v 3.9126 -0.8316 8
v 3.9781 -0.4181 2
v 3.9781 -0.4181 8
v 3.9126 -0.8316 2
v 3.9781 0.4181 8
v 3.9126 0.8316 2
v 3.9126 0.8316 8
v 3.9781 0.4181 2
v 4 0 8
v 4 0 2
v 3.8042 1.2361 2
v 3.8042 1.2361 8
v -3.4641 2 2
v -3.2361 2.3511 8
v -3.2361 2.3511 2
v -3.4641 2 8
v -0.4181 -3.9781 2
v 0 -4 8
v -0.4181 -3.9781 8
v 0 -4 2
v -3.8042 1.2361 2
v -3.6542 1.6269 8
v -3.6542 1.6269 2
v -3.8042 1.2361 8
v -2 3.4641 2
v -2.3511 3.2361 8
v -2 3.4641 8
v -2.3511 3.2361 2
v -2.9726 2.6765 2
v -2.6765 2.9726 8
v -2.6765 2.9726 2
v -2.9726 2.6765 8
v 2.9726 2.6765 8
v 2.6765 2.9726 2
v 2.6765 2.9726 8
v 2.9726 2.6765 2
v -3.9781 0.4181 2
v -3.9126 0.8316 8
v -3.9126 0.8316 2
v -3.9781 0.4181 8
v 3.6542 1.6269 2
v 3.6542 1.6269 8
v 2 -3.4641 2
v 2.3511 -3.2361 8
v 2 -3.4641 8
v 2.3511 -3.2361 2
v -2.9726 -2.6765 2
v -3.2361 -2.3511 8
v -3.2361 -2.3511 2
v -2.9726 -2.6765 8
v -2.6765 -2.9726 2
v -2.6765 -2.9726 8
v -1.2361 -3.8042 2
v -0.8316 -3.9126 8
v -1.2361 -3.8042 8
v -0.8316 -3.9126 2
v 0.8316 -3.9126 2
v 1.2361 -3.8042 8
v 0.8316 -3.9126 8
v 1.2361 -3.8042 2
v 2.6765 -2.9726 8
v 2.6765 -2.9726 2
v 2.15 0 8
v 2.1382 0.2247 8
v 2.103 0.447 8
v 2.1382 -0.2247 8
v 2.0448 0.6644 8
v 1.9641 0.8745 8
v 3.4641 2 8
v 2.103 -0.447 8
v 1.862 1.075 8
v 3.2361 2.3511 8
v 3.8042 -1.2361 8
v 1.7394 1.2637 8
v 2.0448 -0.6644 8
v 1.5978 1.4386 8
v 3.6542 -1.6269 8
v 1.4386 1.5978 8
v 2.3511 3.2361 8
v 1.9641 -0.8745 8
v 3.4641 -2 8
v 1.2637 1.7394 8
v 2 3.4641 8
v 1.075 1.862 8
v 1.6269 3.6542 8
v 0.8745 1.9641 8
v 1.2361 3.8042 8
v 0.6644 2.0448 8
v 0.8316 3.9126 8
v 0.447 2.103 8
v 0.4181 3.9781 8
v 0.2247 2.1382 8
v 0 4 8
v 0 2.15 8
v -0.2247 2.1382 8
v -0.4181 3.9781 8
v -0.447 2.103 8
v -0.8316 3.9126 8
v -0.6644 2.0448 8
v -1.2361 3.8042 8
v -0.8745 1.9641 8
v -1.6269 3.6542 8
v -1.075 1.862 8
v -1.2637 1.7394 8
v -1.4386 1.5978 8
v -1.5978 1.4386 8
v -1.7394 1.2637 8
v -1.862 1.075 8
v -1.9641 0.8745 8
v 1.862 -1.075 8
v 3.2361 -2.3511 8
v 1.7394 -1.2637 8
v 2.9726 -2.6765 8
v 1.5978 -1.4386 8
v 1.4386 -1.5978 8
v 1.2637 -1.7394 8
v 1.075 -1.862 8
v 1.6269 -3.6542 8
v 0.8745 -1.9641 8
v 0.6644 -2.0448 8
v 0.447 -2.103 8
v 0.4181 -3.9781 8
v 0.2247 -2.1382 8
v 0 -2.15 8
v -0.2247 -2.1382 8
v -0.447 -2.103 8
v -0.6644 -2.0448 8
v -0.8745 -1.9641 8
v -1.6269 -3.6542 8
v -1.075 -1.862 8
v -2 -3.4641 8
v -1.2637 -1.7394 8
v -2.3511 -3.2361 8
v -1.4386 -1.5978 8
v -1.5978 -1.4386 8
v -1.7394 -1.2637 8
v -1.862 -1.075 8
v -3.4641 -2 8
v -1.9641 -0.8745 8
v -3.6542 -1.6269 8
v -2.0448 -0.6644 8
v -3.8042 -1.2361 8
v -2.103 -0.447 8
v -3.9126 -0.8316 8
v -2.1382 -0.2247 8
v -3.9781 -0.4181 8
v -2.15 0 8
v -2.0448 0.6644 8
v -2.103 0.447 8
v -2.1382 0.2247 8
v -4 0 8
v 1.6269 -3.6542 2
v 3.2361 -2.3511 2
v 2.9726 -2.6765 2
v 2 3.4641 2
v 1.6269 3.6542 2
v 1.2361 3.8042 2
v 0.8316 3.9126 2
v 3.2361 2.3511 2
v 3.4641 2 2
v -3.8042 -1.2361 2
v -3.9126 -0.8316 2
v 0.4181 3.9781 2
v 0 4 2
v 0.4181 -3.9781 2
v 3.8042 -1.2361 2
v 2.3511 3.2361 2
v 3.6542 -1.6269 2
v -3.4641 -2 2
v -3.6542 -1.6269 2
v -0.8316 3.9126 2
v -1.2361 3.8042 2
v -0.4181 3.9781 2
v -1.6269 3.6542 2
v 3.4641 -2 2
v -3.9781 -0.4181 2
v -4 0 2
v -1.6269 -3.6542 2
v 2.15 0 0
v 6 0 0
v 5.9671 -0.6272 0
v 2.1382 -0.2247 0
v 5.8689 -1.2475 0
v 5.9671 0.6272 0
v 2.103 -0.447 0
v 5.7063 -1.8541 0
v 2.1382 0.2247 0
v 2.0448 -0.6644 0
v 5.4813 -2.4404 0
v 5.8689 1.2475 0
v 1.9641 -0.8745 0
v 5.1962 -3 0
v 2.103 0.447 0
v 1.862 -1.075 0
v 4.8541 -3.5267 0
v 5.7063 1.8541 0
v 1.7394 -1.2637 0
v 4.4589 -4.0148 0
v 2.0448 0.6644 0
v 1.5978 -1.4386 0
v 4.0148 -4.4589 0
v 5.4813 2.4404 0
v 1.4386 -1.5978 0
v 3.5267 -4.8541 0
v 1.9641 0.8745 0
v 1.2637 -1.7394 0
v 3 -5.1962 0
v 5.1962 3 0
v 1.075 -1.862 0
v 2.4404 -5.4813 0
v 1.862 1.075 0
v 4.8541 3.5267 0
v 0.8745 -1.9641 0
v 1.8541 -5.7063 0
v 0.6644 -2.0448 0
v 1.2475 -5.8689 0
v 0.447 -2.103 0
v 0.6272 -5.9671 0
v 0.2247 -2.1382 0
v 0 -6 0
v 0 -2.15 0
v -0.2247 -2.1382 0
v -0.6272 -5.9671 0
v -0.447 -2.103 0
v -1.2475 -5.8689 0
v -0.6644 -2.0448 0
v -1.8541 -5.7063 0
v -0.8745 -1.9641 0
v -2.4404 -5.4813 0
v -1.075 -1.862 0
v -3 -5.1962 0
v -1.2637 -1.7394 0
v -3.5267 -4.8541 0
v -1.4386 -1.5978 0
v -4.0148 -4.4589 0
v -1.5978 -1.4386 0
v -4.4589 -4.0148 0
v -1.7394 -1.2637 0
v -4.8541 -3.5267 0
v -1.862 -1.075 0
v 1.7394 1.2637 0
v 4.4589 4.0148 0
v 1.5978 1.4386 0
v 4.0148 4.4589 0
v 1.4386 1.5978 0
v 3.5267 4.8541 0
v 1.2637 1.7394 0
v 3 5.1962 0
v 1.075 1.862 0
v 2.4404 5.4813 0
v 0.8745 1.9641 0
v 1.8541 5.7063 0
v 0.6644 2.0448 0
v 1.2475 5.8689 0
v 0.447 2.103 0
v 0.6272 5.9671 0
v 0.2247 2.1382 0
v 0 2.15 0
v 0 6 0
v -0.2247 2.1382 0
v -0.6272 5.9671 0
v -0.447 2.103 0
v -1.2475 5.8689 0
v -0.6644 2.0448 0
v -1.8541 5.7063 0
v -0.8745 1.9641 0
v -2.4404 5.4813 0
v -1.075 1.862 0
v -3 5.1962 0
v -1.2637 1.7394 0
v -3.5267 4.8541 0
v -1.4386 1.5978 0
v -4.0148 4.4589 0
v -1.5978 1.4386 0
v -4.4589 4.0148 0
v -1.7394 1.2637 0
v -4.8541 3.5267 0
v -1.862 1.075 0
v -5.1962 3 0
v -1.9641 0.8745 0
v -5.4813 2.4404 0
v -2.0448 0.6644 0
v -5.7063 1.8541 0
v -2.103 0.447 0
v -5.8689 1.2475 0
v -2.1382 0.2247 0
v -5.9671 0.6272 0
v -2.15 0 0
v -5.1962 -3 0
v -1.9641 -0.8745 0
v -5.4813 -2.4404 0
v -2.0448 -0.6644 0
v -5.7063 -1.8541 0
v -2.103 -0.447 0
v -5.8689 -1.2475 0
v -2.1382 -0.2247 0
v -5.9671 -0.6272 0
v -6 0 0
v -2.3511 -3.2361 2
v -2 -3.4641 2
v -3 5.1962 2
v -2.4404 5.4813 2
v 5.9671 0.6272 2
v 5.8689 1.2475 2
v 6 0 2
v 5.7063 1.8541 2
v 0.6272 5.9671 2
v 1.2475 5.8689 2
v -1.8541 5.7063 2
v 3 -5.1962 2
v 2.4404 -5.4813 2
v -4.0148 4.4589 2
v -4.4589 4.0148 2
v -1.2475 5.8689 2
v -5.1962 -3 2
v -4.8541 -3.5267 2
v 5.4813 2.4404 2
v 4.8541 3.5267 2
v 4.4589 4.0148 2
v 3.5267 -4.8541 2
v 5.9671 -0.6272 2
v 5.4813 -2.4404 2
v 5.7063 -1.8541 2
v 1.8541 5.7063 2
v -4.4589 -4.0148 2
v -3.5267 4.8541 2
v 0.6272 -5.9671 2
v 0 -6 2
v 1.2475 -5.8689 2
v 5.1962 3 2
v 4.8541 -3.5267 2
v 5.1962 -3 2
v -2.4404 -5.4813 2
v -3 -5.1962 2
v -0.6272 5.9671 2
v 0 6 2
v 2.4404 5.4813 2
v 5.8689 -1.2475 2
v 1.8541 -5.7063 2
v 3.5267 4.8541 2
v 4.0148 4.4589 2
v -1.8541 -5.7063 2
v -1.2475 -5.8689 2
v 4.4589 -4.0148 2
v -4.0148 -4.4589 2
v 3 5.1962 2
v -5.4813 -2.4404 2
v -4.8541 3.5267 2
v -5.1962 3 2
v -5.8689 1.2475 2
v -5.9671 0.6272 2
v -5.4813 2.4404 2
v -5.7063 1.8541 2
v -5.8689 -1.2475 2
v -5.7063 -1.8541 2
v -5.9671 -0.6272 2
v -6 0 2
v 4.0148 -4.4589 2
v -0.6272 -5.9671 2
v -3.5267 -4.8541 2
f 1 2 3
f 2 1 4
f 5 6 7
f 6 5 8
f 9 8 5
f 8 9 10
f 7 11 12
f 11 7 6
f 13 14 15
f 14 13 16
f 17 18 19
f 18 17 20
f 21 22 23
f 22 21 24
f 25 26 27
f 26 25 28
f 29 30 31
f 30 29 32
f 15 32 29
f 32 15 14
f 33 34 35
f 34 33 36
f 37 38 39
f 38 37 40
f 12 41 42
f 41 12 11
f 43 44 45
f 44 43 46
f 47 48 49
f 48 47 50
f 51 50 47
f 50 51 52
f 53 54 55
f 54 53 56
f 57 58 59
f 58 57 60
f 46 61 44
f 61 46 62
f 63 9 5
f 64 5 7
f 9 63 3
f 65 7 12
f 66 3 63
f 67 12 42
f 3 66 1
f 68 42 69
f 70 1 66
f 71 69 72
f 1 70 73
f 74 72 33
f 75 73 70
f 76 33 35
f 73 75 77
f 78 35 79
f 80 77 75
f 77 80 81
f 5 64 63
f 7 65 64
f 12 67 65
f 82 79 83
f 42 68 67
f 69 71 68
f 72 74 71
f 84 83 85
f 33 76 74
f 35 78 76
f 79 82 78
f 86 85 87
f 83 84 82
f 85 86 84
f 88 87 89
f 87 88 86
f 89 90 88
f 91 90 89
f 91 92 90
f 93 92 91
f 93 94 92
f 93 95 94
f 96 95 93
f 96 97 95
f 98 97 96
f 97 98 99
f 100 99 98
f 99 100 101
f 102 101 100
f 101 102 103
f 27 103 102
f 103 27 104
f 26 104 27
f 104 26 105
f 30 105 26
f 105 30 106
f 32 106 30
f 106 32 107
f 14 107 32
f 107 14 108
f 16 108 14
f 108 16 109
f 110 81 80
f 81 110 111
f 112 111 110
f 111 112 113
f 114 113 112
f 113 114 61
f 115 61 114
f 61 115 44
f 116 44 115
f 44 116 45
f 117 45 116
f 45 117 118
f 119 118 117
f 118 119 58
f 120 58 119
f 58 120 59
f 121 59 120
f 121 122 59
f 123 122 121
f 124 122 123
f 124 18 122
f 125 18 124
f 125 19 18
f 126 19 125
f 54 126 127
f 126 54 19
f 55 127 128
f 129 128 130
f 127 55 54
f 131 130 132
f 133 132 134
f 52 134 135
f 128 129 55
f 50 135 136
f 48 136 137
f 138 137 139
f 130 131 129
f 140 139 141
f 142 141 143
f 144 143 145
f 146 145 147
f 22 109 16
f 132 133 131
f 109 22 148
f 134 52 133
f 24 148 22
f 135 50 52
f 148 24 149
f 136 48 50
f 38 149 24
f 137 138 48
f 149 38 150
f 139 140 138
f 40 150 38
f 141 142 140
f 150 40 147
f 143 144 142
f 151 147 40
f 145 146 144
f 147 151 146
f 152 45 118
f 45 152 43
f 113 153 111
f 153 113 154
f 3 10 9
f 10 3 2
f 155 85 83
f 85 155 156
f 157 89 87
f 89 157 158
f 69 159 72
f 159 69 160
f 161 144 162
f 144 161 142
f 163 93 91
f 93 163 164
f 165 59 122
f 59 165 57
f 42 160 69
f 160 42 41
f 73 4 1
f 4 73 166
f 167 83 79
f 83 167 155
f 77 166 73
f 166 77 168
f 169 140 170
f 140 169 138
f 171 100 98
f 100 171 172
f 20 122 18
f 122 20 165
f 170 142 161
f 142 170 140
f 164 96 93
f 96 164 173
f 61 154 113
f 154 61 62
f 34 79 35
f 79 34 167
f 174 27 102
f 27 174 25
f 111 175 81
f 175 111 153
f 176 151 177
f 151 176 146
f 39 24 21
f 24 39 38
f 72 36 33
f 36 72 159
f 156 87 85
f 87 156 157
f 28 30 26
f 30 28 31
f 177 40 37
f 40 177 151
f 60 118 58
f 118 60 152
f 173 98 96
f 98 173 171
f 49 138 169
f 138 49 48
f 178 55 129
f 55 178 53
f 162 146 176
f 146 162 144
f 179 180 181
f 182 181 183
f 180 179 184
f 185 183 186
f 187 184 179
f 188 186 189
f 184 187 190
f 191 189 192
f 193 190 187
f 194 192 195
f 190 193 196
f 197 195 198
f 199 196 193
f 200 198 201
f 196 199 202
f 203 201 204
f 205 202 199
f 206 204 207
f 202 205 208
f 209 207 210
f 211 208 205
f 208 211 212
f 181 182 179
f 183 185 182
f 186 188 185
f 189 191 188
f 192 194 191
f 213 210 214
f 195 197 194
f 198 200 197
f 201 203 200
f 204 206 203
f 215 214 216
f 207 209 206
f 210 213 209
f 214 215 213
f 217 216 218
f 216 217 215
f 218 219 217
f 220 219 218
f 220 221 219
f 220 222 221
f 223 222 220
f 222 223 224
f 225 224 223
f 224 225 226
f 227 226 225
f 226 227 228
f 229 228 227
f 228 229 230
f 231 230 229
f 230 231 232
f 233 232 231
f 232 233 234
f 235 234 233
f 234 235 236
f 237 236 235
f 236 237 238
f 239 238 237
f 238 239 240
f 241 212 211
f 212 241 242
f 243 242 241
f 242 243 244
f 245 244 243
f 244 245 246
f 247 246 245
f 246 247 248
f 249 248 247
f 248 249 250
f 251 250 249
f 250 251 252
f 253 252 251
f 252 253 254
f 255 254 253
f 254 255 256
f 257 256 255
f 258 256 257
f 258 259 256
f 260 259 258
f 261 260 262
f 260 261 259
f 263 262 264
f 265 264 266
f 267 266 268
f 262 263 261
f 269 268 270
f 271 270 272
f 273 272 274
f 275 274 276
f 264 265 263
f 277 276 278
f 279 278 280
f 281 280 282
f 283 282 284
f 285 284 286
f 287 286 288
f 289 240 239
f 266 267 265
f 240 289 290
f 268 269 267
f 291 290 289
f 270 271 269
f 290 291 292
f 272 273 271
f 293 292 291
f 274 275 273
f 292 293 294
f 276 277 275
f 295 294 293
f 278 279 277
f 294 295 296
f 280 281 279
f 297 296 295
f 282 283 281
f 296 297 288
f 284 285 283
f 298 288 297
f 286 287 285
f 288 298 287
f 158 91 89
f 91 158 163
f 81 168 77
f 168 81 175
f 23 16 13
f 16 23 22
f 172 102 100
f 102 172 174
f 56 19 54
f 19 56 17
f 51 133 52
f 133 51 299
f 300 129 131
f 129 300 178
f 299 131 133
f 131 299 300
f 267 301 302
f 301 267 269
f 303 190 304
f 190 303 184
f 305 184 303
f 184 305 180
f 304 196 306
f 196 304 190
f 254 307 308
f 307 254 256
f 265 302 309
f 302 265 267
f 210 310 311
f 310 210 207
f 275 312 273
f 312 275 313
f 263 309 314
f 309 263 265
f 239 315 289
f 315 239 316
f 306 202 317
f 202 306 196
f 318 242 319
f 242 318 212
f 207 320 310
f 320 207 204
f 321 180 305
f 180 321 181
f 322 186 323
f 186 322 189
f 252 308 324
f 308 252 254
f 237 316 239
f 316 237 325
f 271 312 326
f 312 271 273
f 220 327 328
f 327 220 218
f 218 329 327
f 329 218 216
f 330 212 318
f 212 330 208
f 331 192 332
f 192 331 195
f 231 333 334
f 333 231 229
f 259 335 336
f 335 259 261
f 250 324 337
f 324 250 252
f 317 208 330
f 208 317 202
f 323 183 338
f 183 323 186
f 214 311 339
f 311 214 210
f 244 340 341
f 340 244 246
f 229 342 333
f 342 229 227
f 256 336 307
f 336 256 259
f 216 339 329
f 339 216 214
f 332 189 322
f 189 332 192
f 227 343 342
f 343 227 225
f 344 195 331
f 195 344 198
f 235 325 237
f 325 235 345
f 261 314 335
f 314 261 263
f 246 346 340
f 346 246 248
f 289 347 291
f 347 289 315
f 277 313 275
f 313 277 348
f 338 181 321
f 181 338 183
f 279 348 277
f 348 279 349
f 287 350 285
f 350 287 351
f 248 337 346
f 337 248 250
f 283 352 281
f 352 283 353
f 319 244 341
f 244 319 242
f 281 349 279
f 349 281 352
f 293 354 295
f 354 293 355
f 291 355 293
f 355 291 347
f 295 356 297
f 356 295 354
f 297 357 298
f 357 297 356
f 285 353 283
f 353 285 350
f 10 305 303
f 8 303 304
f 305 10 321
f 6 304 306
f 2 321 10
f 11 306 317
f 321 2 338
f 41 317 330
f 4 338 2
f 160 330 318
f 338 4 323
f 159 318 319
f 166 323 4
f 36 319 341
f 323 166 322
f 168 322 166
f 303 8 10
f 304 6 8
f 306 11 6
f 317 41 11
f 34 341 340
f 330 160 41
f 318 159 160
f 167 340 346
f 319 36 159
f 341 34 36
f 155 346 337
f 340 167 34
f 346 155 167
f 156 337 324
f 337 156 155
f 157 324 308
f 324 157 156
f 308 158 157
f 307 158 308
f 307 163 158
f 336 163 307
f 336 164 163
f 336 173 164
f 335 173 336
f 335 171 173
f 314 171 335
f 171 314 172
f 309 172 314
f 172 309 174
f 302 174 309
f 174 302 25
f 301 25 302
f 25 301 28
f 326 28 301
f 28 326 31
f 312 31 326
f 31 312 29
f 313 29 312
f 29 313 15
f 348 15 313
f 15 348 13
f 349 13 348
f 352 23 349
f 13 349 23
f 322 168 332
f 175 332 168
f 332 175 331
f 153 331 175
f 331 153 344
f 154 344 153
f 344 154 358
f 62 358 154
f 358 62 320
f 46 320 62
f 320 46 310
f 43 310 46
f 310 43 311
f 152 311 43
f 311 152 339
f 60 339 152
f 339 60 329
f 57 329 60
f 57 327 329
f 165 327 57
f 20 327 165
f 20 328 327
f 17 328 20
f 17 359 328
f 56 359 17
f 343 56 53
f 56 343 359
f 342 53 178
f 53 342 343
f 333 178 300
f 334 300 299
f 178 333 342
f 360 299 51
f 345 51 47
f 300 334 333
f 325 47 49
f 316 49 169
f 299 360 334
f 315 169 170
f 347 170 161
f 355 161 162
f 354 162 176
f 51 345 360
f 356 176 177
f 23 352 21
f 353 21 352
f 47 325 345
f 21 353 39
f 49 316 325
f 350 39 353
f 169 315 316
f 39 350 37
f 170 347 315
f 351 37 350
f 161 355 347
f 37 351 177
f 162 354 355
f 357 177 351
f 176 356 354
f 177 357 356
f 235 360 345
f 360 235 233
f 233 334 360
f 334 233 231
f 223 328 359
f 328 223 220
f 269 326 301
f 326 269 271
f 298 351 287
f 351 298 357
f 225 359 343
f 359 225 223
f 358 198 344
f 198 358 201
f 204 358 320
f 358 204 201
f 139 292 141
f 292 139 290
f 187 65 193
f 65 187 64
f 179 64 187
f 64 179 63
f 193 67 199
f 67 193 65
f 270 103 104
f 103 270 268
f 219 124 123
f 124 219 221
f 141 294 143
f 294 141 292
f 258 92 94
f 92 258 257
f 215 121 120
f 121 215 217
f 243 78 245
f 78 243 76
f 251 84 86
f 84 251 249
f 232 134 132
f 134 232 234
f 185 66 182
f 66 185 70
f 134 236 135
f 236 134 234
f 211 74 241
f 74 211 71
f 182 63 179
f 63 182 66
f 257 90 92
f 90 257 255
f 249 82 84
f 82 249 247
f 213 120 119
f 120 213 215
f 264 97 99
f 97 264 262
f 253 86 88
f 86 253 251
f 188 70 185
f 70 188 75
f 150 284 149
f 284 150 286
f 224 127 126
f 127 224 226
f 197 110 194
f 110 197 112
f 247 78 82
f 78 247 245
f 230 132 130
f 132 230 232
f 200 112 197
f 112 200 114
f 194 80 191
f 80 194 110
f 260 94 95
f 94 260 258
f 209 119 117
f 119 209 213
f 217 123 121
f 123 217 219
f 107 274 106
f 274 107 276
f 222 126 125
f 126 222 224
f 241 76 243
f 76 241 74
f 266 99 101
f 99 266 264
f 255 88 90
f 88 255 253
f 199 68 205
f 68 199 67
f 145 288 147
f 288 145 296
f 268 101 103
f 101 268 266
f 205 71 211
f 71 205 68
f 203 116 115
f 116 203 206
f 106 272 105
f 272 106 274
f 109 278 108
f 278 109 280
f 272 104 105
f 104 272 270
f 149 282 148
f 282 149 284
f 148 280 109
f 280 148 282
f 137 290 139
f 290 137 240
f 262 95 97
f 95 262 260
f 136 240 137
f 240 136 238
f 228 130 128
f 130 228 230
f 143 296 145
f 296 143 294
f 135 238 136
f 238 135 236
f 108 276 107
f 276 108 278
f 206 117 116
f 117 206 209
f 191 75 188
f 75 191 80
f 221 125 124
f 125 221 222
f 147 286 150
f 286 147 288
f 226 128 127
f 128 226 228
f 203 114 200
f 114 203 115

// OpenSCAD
// Flanged threaded insert.
$fn = 60;
eps = 0.02;
inner_d = 4.3;
outer_d = 8;
length = 8;
flange_d = 12;
difference() {
    union() { cylinder(d=outer_d,h=length); cylinder(d=flange_d,h=2); }
    translate([0,0,-eps]) cylinder(d=inner_d,h=length+2*eps);
}
